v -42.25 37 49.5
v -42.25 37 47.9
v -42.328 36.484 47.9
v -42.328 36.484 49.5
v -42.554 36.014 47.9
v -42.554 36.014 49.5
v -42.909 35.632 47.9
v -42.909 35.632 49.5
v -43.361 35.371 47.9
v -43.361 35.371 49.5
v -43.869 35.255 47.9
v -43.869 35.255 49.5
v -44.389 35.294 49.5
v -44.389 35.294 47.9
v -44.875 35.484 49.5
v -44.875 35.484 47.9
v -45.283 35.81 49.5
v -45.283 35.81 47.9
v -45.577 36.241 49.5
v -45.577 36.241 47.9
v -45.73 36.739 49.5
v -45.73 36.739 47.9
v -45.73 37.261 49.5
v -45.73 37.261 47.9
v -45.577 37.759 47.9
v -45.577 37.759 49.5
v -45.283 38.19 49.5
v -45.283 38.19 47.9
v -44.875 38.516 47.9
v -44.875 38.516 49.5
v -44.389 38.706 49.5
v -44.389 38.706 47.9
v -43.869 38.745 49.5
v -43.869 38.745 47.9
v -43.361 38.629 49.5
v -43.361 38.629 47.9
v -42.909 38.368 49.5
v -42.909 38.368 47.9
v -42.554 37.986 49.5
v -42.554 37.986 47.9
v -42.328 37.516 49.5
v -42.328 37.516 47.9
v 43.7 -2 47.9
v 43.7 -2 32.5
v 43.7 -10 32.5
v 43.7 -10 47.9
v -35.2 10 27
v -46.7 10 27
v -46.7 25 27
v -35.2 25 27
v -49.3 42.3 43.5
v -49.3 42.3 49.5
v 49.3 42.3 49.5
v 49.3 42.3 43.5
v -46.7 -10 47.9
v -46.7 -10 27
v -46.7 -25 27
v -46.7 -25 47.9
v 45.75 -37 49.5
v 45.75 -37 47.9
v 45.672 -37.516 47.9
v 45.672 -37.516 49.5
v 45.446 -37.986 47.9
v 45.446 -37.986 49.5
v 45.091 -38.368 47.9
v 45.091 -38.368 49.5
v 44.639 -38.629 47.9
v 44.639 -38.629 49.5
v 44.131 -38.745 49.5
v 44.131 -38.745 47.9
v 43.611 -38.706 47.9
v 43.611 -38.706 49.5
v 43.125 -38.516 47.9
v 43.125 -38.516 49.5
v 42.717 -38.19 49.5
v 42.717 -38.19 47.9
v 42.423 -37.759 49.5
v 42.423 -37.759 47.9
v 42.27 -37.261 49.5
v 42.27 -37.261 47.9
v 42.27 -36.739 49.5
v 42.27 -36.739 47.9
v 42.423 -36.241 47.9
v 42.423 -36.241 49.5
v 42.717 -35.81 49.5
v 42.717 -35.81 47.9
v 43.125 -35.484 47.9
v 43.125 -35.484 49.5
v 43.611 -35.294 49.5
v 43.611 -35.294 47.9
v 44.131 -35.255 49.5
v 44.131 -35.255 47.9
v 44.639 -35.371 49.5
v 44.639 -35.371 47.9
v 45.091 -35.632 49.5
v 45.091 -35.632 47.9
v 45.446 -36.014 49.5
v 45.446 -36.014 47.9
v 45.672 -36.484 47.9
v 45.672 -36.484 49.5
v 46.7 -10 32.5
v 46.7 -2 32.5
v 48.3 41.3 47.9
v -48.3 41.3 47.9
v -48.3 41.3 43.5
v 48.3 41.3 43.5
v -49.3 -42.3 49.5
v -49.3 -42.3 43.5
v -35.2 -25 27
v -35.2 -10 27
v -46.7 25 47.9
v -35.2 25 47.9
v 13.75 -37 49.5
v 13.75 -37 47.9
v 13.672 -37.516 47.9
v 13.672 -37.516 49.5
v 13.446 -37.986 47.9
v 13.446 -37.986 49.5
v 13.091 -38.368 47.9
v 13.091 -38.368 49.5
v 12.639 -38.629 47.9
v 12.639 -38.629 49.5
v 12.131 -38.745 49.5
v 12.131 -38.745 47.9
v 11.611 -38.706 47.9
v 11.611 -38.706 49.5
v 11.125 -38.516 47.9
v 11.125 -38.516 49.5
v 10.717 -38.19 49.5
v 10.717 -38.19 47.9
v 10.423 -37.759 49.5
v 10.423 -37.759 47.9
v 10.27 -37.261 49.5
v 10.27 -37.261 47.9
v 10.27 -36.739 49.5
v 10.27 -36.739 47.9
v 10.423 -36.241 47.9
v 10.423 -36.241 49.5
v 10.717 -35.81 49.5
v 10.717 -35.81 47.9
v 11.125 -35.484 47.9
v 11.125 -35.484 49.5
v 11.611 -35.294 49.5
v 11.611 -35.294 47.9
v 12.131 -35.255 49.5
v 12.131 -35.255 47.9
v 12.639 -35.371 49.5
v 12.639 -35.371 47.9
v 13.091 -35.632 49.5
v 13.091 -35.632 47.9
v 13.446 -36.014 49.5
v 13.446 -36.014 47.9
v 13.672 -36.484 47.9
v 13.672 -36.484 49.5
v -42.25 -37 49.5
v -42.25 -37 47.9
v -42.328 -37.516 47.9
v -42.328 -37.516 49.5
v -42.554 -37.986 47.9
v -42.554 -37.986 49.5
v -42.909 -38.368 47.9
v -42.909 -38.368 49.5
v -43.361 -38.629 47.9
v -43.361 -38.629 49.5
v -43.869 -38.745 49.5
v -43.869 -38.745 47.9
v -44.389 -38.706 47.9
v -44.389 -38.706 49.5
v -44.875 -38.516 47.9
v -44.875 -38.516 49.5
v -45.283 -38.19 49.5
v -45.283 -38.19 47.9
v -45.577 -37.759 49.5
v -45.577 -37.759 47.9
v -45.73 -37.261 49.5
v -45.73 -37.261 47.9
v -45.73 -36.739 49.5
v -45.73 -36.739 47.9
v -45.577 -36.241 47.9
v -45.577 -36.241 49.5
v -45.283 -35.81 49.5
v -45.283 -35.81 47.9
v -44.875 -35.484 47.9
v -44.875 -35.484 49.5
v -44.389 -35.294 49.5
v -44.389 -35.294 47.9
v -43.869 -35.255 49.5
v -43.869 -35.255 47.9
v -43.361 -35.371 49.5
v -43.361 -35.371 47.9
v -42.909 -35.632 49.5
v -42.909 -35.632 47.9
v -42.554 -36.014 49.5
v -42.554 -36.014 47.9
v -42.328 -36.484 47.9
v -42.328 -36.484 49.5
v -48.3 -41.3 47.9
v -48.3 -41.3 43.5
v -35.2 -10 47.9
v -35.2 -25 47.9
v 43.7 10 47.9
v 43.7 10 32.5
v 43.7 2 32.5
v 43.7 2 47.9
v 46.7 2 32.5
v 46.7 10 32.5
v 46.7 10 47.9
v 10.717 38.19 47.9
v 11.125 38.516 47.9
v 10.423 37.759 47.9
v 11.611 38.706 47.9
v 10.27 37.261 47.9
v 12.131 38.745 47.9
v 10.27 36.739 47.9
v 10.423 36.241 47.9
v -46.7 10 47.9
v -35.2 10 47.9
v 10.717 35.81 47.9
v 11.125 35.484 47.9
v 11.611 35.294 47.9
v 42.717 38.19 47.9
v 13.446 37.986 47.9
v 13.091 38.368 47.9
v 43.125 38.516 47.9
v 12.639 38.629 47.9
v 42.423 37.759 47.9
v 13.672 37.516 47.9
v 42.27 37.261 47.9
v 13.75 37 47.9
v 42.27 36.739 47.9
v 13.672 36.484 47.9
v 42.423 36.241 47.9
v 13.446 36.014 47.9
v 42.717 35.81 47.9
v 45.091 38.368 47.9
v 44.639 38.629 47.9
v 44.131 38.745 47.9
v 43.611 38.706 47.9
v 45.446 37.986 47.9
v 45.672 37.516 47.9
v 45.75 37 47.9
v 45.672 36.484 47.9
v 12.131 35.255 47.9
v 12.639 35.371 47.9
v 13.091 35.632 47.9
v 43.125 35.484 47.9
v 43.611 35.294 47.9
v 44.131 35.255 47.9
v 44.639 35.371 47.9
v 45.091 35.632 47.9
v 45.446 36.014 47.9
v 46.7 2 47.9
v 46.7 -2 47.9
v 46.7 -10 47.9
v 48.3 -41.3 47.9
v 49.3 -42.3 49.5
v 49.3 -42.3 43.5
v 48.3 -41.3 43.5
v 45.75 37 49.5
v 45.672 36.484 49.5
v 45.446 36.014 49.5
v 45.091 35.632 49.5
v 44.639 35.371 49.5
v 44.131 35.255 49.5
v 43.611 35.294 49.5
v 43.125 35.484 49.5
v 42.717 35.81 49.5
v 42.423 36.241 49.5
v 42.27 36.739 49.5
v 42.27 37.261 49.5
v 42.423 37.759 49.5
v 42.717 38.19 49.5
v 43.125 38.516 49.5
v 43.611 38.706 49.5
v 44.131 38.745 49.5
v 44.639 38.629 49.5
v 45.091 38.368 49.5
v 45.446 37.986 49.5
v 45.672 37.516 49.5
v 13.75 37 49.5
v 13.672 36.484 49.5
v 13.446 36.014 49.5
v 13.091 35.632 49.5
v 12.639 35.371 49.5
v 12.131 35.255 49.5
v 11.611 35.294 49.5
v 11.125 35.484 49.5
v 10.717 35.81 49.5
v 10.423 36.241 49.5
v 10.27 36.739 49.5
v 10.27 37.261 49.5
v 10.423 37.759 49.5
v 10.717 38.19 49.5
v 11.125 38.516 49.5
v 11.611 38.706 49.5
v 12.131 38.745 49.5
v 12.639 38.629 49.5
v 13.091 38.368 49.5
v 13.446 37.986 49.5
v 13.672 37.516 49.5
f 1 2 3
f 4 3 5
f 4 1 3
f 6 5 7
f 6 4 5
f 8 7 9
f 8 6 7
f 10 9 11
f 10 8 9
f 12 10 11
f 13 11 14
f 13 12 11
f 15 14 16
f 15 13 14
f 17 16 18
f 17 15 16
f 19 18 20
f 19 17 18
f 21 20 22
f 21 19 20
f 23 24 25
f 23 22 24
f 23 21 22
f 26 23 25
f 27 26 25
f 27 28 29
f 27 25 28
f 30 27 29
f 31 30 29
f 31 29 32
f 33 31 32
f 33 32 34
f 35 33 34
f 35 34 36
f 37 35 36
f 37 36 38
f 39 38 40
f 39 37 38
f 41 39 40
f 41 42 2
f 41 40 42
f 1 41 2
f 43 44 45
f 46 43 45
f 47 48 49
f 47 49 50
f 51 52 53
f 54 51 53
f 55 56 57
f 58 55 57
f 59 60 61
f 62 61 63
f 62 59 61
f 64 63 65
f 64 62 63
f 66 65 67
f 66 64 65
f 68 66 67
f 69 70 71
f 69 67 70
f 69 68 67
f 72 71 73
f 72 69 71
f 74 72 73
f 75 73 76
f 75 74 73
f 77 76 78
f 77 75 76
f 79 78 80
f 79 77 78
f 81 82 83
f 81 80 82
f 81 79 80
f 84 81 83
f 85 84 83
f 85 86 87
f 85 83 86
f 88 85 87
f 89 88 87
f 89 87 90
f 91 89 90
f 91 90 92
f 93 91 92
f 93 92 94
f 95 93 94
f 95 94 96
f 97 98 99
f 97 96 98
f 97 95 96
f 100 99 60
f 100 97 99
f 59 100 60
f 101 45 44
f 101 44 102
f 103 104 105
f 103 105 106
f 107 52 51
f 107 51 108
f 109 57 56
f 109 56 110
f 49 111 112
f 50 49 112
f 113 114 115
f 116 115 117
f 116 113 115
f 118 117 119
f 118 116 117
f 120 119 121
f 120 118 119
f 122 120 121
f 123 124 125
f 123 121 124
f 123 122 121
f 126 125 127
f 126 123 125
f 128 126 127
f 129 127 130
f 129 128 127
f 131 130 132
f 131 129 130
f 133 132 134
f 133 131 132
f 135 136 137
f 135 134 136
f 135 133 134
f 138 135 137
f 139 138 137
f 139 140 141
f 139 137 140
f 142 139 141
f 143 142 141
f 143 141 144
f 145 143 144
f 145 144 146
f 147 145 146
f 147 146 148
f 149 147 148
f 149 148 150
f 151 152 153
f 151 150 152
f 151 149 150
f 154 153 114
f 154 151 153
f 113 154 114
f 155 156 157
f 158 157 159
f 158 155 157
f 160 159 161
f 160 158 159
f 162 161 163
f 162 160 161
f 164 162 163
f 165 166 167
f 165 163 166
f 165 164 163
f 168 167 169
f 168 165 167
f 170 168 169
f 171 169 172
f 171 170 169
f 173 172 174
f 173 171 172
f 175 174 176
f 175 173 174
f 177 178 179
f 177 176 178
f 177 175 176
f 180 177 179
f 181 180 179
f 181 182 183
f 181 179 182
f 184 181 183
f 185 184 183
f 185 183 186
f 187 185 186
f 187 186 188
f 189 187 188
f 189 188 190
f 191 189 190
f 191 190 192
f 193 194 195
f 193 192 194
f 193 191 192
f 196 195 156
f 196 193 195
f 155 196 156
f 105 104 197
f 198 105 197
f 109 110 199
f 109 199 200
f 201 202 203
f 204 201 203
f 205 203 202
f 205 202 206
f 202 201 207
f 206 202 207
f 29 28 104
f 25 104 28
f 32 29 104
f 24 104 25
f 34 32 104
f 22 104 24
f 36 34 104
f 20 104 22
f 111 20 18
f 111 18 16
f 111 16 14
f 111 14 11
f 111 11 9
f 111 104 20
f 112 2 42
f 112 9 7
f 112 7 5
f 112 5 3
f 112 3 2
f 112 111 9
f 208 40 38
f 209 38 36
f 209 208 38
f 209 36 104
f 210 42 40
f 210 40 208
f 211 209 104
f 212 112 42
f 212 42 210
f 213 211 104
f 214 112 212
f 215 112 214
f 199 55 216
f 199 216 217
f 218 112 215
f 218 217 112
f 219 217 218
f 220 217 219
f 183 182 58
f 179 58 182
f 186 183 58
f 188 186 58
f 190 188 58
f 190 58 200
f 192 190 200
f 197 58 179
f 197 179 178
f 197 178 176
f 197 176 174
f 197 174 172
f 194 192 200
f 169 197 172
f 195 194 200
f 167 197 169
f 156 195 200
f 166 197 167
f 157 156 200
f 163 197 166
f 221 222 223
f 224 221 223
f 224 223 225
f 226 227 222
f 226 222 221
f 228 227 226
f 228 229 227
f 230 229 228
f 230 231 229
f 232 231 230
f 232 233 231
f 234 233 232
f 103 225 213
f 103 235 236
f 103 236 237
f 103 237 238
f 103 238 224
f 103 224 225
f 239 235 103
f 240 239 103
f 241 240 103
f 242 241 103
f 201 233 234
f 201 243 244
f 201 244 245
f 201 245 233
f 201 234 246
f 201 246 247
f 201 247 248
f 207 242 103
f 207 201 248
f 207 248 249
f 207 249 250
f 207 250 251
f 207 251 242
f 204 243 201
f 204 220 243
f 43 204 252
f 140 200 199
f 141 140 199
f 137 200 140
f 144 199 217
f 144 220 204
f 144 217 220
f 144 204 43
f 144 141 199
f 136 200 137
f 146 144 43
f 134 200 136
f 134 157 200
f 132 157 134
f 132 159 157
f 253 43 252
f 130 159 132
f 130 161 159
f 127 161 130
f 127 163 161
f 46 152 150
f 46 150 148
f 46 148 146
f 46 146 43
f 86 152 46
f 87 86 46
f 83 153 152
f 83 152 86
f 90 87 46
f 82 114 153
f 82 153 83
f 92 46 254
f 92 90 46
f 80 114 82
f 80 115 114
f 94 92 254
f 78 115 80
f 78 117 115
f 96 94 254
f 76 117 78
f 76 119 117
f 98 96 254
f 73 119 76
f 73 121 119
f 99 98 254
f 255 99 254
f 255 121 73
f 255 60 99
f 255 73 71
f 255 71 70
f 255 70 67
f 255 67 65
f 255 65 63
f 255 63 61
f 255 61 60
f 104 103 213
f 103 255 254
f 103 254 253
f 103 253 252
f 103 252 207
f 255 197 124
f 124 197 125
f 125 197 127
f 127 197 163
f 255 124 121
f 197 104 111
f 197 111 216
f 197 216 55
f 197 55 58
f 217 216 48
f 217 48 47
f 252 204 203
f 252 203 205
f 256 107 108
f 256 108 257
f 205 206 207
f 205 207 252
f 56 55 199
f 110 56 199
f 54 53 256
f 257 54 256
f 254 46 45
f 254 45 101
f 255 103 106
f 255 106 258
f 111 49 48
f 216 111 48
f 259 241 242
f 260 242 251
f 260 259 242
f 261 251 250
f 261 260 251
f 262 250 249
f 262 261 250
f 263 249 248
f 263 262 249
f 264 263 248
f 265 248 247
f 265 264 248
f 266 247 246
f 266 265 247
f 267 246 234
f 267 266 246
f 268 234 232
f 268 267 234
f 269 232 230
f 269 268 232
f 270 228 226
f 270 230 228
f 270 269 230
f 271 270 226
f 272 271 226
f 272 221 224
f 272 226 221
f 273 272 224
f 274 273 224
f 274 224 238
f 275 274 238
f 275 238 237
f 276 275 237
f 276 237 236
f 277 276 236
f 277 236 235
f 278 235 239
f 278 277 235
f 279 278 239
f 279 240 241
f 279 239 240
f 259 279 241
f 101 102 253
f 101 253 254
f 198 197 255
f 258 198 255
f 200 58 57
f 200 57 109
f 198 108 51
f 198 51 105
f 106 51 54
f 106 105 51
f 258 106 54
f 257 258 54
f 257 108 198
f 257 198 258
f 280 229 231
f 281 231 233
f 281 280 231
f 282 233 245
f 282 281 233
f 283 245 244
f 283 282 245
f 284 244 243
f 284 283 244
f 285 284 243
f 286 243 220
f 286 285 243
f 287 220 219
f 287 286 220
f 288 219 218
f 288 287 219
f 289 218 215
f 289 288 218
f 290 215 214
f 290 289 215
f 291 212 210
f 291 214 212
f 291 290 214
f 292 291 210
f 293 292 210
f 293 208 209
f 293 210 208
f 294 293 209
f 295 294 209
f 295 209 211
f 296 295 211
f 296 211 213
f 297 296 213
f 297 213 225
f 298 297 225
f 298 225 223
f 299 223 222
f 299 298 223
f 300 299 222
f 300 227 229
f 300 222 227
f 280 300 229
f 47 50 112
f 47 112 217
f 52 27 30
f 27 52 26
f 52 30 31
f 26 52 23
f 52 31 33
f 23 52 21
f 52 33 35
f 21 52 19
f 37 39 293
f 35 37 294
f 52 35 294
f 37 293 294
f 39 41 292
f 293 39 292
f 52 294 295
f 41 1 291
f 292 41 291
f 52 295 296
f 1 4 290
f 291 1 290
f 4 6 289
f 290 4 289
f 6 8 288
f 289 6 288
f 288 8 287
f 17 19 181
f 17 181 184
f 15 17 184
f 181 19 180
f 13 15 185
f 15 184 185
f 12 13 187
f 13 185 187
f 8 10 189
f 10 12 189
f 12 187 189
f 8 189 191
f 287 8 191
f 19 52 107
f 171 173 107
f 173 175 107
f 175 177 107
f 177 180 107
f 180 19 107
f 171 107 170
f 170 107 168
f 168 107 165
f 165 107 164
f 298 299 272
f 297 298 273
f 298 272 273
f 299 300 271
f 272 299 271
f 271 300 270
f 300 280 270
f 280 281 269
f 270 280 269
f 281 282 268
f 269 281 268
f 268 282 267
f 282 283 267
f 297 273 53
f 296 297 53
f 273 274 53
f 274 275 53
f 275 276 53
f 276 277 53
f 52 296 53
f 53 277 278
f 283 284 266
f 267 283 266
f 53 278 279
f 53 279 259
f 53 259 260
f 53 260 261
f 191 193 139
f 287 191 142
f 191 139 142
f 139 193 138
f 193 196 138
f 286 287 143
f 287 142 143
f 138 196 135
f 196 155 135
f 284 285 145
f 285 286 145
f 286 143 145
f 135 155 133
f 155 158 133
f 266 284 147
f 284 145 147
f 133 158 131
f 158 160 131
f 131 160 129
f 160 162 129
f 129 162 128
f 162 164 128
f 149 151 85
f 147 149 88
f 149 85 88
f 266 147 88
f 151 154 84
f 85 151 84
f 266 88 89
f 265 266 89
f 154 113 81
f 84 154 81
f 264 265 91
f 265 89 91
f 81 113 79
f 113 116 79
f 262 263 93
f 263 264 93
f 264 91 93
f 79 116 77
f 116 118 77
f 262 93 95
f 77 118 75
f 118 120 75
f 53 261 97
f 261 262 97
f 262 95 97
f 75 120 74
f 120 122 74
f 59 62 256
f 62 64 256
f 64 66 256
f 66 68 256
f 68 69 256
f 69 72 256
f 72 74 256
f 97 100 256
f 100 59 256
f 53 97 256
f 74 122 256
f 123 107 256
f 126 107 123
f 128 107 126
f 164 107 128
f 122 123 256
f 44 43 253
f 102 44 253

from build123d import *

# Parameters (mm, degrees)
SKETCH009_W             = 98.6
SKETCH009_H             = 84.6
PAD006_DEPTH            = 1.6
SKETCH010_W             = 98.6
SKETCH010_H             = 84.6
SKETCH010_W_2           = 96.6
SKETCH010_H_2           = 82.6
PAD007_DEPTH            = 6
SKETCH020_W             = 11.5
SKETCH020_H             = 15
PAD018_DEPTH            = 22.5
SKETCH027_W             = 3
SKETCH027_H             = 8
PAD019_DEPTH            = 17
SKETCH014_R             = 1.75
POCKET009_DEPTH         = 5
BODY003_PLACEMENT_ANGLE = 180


with BuildPart() as part:
    # Sketch009 → Pad006 (new body)
    with BuildSketch(Plane.XY):
        Rectangle(SKETCH009_W, SKETCH009_H)
    extrude(amount=PAD006_DEPTH)

    # Sketch010 → Pad007 (join)
    with BuildSketch(Plane.XY):
        Rectangle(SKETCH010_W, SKETCH010_H)
        Rectangle(SKETCH010_W_2, SKETCH010_H_2, mode=Mode.SUBTRACT)
    extrude(amount=PAD007_DEPTH)

    # Sketch020 → Pad018 (join)
    with BuildSketch(Plane.XY):
        with Locations((-40.95, 17.5)):
            Rectangle(SKETCH020_W, SKETCH020_H)
        with Locations((-40.95, -17.5)):
            Rectangle(SKETCH020_W, SKETCH020_H)
    extrude(amount=PAD018_DEPTH)

    # Sketch027 → Pad019 (join)
    with BuildSketch(Plane.XY):
        with Locations((45.2, 6)):
            Rectangle(SKETCH027_W, SKETCH027_H)
        with Locations((45.2, -6)):
            Rectangle(SKETCH027_W, SKETCH027_H)
    extrude(amount=PAD019_DEPTH)

    # Sketch014 → Pocket009 (cut)
    with BuildSketch(Plane.XY):
        with Locations((-44, 37)):
            Circle(SKETCH014_R)
        with Locations((12, 37)):
            Circle(SKETCH014_R)
        with Locations((44, 37)):
            Circle(SKETCH014_R)
        with Locations((44, -37)):
            Circle(SKETCH014_R)
        with Locations((12, -37)):
            Circle(SKETCH014_R)
        with Locations((-44, -37)):
            Circle(SKETCH014_R)
    extrude(amount=POCKET009_DEPTH, mode=Mode.SUBTRACT)


with BuildPart() as part_1:
    # Body003 placement: moved
    add(part.part.moved(Location((0, 0, 49.5))).rotate(Axis((0, 0, 49.5), (1, 0, 0)), BODY003_PLACEMENT_ANGLE))


solid = part_1.part
